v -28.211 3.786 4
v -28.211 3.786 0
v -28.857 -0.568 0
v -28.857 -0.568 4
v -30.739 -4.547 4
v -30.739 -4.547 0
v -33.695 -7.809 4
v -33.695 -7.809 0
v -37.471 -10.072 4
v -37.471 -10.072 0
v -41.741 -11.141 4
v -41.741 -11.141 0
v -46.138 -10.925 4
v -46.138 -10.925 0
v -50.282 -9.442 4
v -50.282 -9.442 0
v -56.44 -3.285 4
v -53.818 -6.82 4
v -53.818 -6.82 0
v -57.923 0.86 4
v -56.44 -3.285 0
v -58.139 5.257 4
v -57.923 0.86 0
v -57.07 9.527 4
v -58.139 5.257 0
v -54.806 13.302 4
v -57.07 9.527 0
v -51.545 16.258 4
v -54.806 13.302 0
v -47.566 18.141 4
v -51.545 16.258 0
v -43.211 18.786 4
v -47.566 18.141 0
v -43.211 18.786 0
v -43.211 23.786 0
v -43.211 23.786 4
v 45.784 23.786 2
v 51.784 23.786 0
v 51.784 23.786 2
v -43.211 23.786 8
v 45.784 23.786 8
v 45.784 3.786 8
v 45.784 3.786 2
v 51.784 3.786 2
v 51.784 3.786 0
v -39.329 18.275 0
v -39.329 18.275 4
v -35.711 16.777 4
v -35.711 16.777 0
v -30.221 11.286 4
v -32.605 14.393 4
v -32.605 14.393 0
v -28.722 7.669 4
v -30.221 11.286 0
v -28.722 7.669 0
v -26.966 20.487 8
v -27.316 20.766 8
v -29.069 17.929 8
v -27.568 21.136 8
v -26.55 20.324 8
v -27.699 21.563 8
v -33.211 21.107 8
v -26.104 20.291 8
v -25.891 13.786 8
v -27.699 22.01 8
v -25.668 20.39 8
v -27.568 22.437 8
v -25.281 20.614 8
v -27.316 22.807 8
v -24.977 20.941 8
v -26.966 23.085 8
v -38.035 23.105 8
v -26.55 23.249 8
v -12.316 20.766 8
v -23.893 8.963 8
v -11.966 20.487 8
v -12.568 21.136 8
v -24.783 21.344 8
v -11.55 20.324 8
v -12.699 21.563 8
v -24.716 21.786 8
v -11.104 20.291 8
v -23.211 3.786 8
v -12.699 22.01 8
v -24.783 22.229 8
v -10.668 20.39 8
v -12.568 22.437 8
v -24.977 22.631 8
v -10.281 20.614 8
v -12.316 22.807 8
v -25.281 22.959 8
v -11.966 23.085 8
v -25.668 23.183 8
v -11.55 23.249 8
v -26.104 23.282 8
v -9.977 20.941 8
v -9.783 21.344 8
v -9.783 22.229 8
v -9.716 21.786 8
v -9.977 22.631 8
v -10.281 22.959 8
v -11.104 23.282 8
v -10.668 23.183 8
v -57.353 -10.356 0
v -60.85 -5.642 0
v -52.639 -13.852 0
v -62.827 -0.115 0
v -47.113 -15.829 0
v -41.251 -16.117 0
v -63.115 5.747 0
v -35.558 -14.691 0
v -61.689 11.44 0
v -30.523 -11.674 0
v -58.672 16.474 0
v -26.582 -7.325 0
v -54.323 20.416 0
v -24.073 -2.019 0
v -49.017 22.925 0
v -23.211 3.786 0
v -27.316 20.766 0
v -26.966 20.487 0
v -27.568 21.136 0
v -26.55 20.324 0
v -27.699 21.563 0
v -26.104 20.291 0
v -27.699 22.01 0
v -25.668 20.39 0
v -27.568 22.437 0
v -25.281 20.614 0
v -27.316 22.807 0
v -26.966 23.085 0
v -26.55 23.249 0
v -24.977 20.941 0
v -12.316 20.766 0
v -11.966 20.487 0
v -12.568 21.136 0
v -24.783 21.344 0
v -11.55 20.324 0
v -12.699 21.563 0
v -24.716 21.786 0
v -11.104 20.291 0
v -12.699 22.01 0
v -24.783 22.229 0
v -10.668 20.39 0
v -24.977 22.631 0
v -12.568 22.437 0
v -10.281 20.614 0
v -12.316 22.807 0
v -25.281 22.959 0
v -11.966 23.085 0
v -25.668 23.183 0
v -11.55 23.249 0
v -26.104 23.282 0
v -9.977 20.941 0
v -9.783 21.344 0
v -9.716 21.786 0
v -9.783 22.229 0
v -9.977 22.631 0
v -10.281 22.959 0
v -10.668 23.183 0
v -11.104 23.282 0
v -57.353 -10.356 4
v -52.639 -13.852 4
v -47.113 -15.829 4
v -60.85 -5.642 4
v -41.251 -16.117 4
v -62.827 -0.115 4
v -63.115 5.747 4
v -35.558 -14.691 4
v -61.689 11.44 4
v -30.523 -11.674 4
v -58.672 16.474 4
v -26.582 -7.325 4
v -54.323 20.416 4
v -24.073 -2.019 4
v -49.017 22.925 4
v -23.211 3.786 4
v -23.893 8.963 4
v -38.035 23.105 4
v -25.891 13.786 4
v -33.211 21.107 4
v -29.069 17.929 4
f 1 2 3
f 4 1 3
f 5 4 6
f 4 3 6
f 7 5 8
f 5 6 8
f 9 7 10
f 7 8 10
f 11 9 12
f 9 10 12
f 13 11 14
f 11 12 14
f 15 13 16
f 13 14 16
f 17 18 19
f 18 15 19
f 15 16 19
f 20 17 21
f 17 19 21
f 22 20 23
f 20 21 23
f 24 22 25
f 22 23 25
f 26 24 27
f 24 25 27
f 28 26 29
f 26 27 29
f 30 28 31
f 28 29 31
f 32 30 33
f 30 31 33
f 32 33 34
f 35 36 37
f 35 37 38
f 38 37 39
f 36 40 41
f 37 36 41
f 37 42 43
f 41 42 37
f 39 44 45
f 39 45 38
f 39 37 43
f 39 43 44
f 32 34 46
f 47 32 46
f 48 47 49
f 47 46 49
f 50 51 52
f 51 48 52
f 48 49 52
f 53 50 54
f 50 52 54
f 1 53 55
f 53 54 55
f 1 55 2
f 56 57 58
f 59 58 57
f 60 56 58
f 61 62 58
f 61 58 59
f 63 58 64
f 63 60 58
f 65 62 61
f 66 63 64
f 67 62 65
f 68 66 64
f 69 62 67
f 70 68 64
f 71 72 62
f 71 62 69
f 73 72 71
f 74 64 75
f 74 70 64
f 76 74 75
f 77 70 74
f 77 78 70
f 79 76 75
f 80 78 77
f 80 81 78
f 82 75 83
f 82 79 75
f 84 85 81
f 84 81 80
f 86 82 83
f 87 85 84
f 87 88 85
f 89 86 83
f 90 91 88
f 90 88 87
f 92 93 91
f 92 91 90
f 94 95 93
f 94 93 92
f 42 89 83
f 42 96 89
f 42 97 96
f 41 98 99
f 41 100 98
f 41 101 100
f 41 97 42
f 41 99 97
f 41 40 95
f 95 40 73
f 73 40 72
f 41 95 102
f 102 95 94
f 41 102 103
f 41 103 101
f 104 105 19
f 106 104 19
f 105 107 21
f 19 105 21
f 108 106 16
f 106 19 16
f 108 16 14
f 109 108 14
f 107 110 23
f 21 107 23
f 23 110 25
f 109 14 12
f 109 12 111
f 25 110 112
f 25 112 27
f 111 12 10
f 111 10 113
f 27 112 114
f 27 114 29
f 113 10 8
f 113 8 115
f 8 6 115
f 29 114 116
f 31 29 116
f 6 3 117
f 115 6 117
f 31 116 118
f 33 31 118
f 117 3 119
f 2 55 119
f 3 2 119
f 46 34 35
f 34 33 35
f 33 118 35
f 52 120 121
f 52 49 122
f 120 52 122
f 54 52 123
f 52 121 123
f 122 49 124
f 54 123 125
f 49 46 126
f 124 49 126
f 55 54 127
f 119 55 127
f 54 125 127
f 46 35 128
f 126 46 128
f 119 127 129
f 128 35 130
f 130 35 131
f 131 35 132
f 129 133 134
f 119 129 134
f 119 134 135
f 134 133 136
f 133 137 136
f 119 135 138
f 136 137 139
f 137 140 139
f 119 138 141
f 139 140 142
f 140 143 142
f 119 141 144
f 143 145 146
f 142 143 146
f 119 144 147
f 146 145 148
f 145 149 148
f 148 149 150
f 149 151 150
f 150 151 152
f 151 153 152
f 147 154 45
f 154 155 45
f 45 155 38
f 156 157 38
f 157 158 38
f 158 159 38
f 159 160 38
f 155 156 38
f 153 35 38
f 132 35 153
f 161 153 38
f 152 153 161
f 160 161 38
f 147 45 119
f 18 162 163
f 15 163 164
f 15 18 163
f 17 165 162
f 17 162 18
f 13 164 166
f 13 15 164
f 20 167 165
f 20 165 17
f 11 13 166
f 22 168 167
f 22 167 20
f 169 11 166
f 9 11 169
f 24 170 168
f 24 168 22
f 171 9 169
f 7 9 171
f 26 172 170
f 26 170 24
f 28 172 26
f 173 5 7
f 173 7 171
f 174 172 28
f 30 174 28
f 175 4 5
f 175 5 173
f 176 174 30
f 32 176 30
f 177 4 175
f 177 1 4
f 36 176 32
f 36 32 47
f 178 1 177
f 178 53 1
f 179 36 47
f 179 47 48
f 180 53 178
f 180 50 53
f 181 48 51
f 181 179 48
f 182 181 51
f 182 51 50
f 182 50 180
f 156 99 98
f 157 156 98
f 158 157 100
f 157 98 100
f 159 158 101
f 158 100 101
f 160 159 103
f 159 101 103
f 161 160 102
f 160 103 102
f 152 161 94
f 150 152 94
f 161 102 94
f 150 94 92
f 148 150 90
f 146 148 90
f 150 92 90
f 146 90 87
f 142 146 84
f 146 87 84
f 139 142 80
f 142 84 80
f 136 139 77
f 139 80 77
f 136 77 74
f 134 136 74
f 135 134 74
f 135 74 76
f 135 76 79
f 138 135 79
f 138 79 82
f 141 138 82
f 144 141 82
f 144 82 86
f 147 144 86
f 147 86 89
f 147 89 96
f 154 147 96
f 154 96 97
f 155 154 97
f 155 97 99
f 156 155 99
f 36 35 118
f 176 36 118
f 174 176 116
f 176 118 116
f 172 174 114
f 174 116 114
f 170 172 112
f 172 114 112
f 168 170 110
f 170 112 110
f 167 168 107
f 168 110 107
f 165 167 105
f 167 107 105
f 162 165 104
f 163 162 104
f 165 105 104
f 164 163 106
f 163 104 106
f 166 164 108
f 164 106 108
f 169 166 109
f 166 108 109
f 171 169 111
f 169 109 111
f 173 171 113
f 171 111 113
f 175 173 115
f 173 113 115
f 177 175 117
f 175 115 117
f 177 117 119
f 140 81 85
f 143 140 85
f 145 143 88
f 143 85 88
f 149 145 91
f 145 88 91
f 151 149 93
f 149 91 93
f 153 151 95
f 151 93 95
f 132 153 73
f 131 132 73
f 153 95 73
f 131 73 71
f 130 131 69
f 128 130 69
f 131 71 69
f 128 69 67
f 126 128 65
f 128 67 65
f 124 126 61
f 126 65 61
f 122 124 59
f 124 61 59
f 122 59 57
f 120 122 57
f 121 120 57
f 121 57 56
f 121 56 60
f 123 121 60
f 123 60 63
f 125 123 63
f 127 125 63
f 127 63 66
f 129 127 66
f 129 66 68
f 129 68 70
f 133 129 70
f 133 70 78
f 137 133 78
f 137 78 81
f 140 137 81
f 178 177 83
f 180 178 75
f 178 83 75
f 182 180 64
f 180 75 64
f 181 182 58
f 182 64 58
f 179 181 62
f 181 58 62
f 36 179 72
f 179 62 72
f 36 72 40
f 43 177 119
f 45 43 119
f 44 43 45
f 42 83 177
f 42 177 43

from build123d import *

# Parameters (mm, degrees)
BOSS_EXTRU_1_DEPTH      = 8
ESQUISSE2_R             = 20
ESQUISSE2_R_2           = 15
ENL_V_MAT_EXTRU_1_DEPTH = 4
ESQUISSE3_W             = 9.17
ESQUISSE3_H             = 20
BOSS_EXTRU_2_DEPTH      = 8
ESQUISSE7_W             = 6
ESQUISSE7_H             = 20
ENL_V_MAT_EXTRU_5_DEPTH = 6
ESQUISSE8_R             = 1.5
ENL_V_MAT_EXTRU_6_DEPTH = 10


with BuildPart() as part:
    # Esquisse1 → Boss.-Extru.1 (new body)
    with BuildSketch(Plane.XY):
        with BuildLine():
            Line((42.613906887, 3.786407767), (42.613906887, 23.786407767))
            Line((42.613906887, 23.786407767), (-43.211335831, 23.786407767))
            ThreePointArc((-43.211335831, 23.786407767), (-29.069200208, 17.928543391), (-23.211335831, 3.786407767))
            Line((-23.211335831, 3.786407767), (42.613906887, 3.786407767))
        make_face()
        with BuildLine():
            ThreePointArc((-23.211335831, 3.786407767), (-29.069200208, 17.928543391), (-43.211335831, 23.786407767))
            Line((-43.211335831, 23.786407767), (-43.211335831, 18.786407767))
            ThreePointArc((-43.211335831, 18.786407767), (-32.604734113, 14.393009485), (-28.211335831, 3.786407767))
            Line((-28.211335831, 3.786407767), (-23.211335831, 3.786407767))
        make_face()
        with BuildLine():
            Line((-43.211335831, 18.786407767), (-43.211335831, 23.786407767))
            ThreePointArc((-43.211335831, 23.786407767), (-57.353471455, -10.355727857), (-23.211335831, 3.786407767))
            Line((-23.211335831, 3.786407767), (-28.211335831, 3.786407767))
            ThreePointArc((-28.211335831, 3.786407767), (-53.817937549, -6.820193951), (-43.211335831, 18.786407767))
        make_face()
    extrude(amount=BOSS_EXTRU_1_DEPTH)

    # Esquisse2 → Enlèv. mat.-Extru.1 (cut)
    with BuildSketch(Plane.XY.offset(8)):
        with Locations((-43.211335831, 3.786407767)):
            Circle(ESQUISSE2_R)
        with Locations((-43.211335831, 3.786407767)):
            Circle(ESQUISSE2_R_2, mode=Mode.SUBTRACT)
    extrude(amount=-ENL_V_MAT_EXTRU_1_DEPTH, mode=Mode.SUBTRACT)

    # Esquisse3 → Boss.-Extru.2 (add)
    with BuildSketch(Plane.XY.offset(8)):
        with Locations((47.198906887, 13.786407767)):
            Rectangle(ESQUISSE3_W, ESQUISSE3_H)
    extrude(amount=-BOSS_EXTRU_2_DEPTH)

    # Esquisse7 → Enlèv. mat.-Extru.5 (cut)
    with BuildSketch(Plane.XY.offset(8)):
        with Locations((48.783906887, 13.786407767)):
            Rectangle(ESQUISSE7_W, ESQUISSE7_H)
    extrude(amount=-ENL_V_MAT_EXTRU_5_DEPTH, mode=Mode.SUBTRACT)

    # Esquisse8 → Enlèv. mat.-Extru.6 (cut)
    with BuildSketch(Plane.XY.offset(8)):
        with Locations((-26.216093113, 21.786407767)):
            Circle(ESQUISSE8_R)
        with Locations((-11.216093113, 21.786407767)):
            Circle(ESQUISSE8_R)
    extrude(amount=-ENL_V_MAT_EXTRU_6_DEPTH, mode=Mode.SUBTRACT)


solid = part.part
